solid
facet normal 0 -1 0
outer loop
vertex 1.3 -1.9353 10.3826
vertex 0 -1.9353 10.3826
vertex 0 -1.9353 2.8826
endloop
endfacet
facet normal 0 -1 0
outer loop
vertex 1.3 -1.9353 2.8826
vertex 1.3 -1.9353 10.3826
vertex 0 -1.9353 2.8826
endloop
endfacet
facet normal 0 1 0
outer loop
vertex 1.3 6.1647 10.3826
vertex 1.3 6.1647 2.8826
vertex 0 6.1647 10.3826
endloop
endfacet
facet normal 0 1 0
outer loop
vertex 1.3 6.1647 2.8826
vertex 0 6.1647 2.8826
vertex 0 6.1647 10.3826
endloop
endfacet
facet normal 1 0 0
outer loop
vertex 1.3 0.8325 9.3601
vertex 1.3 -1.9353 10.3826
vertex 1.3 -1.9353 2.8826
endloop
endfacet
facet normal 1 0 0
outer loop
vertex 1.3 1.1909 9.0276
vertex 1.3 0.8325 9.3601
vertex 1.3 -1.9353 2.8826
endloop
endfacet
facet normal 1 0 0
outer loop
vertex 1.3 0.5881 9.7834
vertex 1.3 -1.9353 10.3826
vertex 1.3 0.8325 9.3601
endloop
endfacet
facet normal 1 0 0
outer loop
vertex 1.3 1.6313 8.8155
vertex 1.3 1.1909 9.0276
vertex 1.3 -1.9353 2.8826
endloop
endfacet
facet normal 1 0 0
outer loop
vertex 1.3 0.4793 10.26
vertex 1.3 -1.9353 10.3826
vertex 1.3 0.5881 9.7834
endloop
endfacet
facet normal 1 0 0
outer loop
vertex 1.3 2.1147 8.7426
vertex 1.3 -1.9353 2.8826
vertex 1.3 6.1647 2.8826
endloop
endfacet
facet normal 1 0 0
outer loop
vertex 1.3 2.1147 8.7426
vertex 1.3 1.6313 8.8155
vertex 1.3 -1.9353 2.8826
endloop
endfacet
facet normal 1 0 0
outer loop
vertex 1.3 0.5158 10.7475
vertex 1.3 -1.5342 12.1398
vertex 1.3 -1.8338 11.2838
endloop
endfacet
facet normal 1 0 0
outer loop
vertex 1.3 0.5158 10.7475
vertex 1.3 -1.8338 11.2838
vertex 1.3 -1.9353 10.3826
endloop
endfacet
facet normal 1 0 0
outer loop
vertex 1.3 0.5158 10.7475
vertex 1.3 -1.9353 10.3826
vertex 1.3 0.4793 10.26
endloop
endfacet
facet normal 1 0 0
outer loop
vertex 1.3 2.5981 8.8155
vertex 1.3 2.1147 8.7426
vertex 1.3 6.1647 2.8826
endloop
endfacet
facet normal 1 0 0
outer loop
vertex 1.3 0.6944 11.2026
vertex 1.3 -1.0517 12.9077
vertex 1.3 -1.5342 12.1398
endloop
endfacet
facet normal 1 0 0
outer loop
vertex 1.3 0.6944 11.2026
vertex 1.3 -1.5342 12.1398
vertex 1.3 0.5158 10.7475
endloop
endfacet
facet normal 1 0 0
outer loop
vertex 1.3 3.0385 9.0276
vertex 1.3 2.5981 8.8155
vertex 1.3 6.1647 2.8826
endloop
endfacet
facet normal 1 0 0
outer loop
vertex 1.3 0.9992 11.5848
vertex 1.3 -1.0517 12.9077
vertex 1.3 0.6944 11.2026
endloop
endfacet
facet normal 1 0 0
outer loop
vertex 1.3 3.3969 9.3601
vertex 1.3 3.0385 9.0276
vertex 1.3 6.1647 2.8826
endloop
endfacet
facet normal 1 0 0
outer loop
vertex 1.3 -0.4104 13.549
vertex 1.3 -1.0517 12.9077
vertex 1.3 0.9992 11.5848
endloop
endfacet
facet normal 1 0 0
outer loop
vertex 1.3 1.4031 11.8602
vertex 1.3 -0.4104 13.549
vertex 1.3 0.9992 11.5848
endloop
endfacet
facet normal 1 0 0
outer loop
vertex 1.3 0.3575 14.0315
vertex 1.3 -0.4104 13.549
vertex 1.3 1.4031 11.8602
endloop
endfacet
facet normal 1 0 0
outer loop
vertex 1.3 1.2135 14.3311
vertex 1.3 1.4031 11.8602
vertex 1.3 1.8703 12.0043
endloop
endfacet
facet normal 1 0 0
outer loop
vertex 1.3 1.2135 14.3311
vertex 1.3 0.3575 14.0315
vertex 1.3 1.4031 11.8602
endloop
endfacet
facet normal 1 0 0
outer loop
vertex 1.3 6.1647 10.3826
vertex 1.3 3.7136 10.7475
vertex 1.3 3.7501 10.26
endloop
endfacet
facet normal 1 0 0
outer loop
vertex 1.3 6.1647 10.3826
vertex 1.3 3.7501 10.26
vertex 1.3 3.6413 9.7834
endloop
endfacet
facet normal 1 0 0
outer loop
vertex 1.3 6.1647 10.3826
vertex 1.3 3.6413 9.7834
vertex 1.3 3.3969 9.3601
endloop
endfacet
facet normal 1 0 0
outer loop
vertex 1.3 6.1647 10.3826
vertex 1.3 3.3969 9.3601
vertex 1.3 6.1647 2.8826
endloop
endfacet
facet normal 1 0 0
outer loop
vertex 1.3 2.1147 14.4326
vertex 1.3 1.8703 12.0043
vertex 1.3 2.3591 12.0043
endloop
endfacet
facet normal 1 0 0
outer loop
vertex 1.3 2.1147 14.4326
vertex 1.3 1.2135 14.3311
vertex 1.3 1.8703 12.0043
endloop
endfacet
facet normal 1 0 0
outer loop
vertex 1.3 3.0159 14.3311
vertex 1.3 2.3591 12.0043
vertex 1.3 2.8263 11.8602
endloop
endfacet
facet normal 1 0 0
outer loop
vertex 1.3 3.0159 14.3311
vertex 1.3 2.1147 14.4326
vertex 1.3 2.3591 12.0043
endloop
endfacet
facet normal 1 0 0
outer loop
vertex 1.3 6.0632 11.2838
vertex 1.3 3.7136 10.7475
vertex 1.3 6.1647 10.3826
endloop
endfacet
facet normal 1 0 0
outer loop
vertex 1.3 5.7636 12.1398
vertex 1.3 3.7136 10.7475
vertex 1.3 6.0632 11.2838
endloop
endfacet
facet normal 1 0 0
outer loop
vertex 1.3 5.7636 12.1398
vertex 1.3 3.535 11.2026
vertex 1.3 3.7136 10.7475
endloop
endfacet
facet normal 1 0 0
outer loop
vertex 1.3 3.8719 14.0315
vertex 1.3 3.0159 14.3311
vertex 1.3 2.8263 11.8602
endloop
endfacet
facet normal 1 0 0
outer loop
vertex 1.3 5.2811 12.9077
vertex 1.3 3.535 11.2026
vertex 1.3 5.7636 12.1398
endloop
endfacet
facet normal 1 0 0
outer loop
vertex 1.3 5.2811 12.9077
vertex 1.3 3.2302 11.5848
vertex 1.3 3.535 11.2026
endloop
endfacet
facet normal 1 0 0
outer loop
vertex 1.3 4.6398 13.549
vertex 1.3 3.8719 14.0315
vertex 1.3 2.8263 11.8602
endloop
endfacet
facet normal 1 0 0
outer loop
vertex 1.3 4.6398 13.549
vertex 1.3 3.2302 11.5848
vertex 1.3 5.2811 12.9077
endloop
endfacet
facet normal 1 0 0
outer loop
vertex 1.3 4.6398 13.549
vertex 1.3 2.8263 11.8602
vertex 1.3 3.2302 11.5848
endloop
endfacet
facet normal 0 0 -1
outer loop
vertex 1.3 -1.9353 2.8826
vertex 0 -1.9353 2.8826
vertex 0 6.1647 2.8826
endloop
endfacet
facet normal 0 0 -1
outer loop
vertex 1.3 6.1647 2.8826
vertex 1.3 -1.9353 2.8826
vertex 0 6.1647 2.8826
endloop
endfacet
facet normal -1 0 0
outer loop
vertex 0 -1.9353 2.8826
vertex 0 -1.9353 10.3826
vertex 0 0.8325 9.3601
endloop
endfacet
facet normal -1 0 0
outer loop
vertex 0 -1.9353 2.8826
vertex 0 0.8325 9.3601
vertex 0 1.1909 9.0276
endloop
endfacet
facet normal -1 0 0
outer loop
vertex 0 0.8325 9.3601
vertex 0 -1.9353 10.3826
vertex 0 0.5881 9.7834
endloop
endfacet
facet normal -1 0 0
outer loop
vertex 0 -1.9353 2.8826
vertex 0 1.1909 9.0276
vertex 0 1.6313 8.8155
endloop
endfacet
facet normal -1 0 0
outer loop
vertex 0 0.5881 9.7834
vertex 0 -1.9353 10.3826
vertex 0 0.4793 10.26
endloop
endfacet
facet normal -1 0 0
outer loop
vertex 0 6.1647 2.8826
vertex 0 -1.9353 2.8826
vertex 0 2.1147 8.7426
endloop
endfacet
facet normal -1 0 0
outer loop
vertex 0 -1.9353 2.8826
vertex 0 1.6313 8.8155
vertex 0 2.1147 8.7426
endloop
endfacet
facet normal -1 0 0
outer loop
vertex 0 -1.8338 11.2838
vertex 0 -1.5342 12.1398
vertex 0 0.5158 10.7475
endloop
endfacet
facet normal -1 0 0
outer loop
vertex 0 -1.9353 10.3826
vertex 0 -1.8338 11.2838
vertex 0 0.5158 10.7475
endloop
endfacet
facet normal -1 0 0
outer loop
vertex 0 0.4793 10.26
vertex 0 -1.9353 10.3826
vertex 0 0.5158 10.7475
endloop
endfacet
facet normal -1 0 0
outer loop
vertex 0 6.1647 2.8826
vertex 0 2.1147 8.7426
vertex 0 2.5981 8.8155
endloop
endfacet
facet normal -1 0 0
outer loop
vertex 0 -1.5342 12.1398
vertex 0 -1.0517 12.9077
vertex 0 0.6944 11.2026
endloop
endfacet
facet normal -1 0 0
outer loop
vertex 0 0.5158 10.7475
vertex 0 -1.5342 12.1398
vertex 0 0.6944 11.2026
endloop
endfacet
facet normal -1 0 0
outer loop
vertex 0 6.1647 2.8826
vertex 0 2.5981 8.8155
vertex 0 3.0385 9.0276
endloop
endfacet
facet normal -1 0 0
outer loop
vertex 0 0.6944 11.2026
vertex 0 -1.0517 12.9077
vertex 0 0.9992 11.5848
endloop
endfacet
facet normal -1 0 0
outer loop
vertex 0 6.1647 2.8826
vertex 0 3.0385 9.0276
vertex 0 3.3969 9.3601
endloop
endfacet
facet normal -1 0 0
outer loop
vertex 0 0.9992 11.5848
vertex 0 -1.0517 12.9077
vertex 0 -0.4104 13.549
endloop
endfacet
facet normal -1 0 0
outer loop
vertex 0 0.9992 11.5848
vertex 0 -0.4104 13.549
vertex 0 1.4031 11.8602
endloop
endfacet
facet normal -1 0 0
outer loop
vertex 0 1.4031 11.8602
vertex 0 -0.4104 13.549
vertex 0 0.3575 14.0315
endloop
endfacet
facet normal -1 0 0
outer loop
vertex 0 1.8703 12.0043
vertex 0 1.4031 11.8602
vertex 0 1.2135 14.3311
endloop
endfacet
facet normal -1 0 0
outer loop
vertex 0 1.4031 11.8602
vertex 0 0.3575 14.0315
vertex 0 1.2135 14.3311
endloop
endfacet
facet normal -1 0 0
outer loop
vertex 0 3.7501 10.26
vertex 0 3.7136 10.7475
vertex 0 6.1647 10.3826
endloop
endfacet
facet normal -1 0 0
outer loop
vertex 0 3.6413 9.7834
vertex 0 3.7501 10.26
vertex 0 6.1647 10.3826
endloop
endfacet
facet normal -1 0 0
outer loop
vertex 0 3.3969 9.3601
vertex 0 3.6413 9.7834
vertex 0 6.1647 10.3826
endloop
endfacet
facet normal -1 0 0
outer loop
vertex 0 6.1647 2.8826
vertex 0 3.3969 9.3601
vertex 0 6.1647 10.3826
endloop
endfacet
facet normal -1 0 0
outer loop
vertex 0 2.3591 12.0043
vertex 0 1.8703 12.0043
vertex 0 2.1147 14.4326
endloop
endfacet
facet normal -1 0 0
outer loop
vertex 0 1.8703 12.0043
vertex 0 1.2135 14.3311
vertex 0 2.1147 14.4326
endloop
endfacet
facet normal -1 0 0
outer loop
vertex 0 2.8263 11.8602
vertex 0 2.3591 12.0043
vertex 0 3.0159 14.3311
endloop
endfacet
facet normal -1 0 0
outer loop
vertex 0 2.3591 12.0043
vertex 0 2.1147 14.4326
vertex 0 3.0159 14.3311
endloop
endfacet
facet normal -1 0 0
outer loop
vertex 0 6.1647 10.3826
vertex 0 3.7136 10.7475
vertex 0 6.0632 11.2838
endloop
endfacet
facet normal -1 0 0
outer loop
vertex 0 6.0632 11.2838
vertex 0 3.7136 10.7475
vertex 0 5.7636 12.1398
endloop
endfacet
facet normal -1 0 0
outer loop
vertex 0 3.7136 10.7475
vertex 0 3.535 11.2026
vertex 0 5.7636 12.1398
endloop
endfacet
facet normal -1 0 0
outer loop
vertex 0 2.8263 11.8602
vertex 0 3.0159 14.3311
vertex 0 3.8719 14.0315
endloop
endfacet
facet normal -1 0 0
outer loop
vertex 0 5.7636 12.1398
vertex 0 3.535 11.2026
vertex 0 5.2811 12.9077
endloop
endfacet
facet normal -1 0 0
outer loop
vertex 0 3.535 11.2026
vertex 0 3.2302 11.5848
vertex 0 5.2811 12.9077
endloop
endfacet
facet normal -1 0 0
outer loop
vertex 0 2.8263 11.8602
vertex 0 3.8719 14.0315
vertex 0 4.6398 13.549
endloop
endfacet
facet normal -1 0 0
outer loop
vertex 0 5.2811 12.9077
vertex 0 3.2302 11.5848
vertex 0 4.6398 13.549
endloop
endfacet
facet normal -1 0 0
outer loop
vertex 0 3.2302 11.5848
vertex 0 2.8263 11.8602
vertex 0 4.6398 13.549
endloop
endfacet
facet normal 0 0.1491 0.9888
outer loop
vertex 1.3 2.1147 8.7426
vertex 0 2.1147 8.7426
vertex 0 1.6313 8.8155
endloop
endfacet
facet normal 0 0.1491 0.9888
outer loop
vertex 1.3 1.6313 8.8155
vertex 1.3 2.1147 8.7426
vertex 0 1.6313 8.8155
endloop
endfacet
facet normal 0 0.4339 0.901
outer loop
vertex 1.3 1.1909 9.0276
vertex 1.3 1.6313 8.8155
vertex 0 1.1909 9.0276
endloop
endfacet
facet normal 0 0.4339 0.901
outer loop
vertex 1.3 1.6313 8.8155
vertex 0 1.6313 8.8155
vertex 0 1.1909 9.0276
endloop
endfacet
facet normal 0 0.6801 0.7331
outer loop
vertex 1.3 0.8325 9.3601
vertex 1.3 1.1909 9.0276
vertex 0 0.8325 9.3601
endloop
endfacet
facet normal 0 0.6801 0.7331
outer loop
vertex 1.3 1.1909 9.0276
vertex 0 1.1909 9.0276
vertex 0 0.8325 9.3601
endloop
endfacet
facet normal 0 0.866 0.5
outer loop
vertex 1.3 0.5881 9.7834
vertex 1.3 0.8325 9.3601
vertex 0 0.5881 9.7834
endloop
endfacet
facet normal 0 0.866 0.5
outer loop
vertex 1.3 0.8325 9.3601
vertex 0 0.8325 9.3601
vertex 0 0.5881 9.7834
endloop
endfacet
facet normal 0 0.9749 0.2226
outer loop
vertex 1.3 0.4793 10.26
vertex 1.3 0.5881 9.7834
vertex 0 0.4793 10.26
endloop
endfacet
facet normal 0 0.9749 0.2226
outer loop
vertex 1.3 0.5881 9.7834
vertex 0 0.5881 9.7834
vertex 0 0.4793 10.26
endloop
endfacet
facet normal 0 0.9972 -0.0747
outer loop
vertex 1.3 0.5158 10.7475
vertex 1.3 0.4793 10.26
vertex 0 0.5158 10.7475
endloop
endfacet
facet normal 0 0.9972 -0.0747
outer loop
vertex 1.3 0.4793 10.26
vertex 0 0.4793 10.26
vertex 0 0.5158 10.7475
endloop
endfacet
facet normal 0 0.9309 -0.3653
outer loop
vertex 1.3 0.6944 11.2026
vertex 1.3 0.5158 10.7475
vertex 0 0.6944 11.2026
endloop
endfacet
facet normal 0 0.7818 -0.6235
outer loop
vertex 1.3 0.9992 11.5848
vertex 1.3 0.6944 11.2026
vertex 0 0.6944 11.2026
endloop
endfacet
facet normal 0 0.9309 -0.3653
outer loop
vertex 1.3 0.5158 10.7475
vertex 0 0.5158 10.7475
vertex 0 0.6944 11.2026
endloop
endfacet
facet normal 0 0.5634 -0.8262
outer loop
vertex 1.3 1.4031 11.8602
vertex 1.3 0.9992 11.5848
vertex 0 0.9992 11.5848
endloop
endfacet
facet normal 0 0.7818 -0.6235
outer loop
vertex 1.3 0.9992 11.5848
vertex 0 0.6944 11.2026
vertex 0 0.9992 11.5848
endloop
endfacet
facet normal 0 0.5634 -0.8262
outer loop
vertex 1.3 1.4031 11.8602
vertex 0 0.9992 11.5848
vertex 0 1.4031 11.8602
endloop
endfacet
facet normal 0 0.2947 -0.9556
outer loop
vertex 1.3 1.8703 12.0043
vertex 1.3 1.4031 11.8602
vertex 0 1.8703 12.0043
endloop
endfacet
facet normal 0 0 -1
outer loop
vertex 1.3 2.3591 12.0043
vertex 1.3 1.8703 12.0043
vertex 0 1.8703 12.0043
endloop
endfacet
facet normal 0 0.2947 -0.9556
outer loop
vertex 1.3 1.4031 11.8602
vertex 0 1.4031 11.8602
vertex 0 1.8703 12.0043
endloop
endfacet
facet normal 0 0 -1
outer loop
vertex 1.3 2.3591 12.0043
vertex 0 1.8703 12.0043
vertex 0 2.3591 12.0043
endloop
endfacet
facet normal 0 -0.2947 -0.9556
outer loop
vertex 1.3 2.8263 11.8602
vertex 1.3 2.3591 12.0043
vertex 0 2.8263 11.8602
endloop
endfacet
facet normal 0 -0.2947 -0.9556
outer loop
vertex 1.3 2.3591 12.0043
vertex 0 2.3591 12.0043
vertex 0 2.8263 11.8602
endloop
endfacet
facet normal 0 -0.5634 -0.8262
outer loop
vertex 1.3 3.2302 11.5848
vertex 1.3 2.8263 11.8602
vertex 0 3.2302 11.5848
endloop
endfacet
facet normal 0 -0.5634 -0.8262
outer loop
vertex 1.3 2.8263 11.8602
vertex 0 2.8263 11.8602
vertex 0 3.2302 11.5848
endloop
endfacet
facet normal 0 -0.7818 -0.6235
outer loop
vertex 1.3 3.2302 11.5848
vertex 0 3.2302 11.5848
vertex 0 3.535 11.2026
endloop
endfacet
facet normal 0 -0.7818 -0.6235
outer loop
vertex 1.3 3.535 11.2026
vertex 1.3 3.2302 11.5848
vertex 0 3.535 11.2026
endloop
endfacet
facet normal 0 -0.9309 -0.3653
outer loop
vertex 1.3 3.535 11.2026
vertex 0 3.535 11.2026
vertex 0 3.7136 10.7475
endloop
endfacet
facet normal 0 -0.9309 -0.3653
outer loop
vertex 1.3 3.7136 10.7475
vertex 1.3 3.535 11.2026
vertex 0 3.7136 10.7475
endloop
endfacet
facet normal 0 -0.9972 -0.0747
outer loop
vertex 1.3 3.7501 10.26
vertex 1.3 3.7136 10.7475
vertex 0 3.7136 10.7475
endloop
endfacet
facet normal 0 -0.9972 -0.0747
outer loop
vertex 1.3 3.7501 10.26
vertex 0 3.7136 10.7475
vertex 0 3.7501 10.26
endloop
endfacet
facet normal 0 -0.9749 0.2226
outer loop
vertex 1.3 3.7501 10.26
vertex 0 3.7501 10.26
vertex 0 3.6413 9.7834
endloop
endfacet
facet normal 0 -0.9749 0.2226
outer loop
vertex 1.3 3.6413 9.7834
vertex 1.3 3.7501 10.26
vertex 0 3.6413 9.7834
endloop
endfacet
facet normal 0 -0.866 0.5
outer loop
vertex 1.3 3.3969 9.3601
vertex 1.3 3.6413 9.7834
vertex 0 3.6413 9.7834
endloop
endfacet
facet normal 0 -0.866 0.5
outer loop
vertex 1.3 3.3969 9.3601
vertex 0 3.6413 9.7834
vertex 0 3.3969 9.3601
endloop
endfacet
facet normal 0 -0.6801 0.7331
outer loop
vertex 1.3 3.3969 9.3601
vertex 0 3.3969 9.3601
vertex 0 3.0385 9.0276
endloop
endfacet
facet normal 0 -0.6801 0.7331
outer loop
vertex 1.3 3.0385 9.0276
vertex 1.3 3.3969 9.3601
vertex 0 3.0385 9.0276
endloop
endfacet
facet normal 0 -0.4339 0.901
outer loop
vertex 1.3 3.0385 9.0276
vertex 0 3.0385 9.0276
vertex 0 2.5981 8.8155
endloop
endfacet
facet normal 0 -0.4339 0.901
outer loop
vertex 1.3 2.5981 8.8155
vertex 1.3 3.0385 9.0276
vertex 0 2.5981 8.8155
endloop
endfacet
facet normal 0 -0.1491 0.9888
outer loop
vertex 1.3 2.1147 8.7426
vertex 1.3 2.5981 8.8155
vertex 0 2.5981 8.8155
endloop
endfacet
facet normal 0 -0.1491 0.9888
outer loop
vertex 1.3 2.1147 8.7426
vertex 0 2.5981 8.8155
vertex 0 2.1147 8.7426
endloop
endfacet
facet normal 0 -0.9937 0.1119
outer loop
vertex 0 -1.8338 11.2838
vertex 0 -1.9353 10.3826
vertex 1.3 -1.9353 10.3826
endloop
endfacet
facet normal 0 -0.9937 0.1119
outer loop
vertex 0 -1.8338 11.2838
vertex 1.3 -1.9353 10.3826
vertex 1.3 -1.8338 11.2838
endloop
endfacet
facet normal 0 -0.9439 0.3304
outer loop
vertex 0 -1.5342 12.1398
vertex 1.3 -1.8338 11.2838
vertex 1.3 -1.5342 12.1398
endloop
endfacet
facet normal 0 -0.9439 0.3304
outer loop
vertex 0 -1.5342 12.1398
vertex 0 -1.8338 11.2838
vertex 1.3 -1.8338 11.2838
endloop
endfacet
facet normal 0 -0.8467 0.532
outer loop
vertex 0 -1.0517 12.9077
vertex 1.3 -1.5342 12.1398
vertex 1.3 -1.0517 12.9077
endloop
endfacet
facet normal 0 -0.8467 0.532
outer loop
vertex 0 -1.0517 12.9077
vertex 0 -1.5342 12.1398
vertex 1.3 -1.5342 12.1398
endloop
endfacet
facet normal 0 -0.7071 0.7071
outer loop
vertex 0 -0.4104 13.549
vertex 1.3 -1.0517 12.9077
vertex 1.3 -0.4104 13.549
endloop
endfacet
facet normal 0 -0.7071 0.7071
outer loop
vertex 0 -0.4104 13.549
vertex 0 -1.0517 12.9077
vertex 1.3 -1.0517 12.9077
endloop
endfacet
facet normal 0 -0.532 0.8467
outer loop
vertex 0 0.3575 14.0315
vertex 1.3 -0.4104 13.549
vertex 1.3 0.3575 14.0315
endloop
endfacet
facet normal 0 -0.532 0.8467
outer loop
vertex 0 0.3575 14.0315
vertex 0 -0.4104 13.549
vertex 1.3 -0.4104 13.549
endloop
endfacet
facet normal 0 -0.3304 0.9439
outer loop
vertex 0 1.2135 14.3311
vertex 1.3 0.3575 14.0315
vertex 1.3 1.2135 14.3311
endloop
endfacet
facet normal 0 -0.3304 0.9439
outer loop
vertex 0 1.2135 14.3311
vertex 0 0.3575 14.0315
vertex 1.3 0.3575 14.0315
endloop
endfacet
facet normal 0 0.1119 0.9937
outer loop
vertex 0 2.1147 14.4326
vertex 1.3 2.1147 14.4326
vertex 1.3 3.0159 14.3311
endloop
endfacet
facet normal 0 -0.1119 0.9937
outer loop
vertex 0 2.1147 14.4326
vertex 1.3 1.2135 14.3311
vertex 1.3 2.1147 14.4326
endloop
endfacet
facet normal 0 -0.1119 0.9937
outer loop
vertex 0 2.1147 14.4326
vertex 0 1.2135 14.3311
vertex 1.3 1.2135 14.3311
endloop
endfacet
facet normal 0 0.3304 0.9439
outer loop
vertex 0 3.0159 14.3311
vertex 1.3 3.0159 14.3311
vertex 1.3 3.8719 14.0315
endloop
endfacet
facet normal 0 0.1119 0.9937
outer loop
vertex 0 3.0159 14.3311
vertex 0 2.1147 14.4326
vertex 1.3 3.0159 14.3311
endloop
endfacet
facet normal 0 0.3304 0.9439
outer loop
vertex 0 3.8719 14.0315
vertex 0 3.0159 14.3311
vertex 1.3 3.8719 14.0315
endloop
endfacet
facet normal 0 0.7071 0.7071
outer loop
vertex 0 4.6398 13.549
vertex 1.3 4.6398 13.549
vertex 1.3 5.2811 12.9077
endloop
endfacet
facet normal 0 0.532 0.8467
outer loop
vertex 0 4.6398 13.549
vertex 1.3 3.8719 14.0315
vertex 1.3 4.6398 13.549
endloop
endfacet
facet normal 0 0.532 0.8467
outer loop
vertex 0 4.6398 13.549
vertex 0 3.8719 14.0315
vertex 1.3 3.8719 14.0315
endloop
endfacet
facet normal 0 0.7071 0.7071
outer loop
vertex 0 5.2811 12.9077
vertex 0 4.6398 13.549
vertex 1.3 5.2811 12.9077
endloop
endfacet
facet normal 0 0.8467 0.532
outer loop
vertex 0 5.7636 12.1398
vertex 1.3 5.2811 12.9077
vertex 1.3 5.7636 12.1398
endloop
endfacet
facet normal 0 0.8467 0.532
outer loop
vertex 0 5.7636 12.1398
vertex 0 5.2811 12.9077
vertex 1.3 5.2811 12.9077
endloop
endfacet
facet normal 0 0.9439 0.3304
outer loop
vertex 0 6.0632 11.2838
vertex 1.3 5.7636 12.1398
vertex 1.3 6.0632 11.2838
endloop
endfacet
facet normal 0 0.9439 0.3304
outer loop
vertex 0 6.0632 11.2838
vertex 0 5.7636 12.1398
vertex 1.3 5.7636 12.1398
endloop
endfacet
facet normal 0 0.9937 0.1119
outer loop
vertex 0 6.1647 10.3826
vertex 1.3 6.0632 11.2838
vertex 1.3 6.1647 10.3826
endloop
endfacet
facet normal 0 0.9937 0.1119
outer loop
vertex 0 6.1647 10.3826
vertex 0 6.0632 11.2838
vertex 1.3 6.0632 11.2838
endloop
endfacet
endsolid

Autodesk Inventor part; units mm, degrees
ref_plane "YZ Plane" through (0, 0, 0) normal (1, 0, 0) x (0, 1, 0)
ref_plane "XZ Plane" through (0, 0, 0) normal (0, 1, 0) x (-1, 0, 0)
ref_plane "XY Plane" through (0, 0, 0) normal (0, 0, 1) x (1, 0, 0)
sketch "スケッチ1" plane through (0, 0, 0) normal (1, 0, 0) x (0, 1, 0)
  line L0 (6.1647, 10.3826) -> (-1.9353, 10.3826)
  line L1 (-1.9353, 10.3826) -> (-1.9353, 2.8826)
  line L2 (-1.9353, 2.8826) -> (6.1647, 2.8826)
  line L3 (6.1647, 2.8826) -> (6.1647, 10.3826)
  arc A0 (6.1647, 10.3826) -> (-1.9353, 10.3826) centre (2.1147, 10.3826) ccw
  circle A1 centre (2.1147, 10.3826) radius 1.64
  point P0 (0, 0)
  dimension "d0" = 8.1
  dimension "d1" = 7.5
  dimension "d2" = 3.28
extrude "押し出し1" add sketch "スケッチ1" along normal blind 1.3
sketch "スケッチ2" plane through (1.3, 0, 0) normal (1, 0, 0) x (0, 0, -1)
  point P0 (0, 0)
sketch "スケッチ3" plane through (1.3, 0, 0) normal (1, 0, 0) x (0, 0, -1)
  arc A0 (-10.3826, 6.1647) -> (-10.3826, -1.9353) centre (-10.3826, 2.1147) ccw projected
  circle A1 centre (-10.3826, 2.1147) radius 1.64
  point P0 (0, 0)
  dimension "d6" = 3.28
hole "穴1" at (1.3, 2.1147, 10.3826) direction (-1, 0, 0) diameter 3.28 depth 1.3
equation "\"BendRadius\" = Thickness"
equation "\"BendReliefWidth\" = Thickness"
equation "\"BendReliefDepth\" = 0.5 * Thickness"
equation "\"CornerReliefSize\" = 4 * Thickness"
equation "\"MinimumRemnant\" = 2 * Thickness"
equation "\"TransitionRadius\" = BendRadius"
equation "\"JacobiRadiusSize\" = BendRadius"
equation "\"GapSize\" = Thickness"
equation "\"Thickness\" = 0.5"
